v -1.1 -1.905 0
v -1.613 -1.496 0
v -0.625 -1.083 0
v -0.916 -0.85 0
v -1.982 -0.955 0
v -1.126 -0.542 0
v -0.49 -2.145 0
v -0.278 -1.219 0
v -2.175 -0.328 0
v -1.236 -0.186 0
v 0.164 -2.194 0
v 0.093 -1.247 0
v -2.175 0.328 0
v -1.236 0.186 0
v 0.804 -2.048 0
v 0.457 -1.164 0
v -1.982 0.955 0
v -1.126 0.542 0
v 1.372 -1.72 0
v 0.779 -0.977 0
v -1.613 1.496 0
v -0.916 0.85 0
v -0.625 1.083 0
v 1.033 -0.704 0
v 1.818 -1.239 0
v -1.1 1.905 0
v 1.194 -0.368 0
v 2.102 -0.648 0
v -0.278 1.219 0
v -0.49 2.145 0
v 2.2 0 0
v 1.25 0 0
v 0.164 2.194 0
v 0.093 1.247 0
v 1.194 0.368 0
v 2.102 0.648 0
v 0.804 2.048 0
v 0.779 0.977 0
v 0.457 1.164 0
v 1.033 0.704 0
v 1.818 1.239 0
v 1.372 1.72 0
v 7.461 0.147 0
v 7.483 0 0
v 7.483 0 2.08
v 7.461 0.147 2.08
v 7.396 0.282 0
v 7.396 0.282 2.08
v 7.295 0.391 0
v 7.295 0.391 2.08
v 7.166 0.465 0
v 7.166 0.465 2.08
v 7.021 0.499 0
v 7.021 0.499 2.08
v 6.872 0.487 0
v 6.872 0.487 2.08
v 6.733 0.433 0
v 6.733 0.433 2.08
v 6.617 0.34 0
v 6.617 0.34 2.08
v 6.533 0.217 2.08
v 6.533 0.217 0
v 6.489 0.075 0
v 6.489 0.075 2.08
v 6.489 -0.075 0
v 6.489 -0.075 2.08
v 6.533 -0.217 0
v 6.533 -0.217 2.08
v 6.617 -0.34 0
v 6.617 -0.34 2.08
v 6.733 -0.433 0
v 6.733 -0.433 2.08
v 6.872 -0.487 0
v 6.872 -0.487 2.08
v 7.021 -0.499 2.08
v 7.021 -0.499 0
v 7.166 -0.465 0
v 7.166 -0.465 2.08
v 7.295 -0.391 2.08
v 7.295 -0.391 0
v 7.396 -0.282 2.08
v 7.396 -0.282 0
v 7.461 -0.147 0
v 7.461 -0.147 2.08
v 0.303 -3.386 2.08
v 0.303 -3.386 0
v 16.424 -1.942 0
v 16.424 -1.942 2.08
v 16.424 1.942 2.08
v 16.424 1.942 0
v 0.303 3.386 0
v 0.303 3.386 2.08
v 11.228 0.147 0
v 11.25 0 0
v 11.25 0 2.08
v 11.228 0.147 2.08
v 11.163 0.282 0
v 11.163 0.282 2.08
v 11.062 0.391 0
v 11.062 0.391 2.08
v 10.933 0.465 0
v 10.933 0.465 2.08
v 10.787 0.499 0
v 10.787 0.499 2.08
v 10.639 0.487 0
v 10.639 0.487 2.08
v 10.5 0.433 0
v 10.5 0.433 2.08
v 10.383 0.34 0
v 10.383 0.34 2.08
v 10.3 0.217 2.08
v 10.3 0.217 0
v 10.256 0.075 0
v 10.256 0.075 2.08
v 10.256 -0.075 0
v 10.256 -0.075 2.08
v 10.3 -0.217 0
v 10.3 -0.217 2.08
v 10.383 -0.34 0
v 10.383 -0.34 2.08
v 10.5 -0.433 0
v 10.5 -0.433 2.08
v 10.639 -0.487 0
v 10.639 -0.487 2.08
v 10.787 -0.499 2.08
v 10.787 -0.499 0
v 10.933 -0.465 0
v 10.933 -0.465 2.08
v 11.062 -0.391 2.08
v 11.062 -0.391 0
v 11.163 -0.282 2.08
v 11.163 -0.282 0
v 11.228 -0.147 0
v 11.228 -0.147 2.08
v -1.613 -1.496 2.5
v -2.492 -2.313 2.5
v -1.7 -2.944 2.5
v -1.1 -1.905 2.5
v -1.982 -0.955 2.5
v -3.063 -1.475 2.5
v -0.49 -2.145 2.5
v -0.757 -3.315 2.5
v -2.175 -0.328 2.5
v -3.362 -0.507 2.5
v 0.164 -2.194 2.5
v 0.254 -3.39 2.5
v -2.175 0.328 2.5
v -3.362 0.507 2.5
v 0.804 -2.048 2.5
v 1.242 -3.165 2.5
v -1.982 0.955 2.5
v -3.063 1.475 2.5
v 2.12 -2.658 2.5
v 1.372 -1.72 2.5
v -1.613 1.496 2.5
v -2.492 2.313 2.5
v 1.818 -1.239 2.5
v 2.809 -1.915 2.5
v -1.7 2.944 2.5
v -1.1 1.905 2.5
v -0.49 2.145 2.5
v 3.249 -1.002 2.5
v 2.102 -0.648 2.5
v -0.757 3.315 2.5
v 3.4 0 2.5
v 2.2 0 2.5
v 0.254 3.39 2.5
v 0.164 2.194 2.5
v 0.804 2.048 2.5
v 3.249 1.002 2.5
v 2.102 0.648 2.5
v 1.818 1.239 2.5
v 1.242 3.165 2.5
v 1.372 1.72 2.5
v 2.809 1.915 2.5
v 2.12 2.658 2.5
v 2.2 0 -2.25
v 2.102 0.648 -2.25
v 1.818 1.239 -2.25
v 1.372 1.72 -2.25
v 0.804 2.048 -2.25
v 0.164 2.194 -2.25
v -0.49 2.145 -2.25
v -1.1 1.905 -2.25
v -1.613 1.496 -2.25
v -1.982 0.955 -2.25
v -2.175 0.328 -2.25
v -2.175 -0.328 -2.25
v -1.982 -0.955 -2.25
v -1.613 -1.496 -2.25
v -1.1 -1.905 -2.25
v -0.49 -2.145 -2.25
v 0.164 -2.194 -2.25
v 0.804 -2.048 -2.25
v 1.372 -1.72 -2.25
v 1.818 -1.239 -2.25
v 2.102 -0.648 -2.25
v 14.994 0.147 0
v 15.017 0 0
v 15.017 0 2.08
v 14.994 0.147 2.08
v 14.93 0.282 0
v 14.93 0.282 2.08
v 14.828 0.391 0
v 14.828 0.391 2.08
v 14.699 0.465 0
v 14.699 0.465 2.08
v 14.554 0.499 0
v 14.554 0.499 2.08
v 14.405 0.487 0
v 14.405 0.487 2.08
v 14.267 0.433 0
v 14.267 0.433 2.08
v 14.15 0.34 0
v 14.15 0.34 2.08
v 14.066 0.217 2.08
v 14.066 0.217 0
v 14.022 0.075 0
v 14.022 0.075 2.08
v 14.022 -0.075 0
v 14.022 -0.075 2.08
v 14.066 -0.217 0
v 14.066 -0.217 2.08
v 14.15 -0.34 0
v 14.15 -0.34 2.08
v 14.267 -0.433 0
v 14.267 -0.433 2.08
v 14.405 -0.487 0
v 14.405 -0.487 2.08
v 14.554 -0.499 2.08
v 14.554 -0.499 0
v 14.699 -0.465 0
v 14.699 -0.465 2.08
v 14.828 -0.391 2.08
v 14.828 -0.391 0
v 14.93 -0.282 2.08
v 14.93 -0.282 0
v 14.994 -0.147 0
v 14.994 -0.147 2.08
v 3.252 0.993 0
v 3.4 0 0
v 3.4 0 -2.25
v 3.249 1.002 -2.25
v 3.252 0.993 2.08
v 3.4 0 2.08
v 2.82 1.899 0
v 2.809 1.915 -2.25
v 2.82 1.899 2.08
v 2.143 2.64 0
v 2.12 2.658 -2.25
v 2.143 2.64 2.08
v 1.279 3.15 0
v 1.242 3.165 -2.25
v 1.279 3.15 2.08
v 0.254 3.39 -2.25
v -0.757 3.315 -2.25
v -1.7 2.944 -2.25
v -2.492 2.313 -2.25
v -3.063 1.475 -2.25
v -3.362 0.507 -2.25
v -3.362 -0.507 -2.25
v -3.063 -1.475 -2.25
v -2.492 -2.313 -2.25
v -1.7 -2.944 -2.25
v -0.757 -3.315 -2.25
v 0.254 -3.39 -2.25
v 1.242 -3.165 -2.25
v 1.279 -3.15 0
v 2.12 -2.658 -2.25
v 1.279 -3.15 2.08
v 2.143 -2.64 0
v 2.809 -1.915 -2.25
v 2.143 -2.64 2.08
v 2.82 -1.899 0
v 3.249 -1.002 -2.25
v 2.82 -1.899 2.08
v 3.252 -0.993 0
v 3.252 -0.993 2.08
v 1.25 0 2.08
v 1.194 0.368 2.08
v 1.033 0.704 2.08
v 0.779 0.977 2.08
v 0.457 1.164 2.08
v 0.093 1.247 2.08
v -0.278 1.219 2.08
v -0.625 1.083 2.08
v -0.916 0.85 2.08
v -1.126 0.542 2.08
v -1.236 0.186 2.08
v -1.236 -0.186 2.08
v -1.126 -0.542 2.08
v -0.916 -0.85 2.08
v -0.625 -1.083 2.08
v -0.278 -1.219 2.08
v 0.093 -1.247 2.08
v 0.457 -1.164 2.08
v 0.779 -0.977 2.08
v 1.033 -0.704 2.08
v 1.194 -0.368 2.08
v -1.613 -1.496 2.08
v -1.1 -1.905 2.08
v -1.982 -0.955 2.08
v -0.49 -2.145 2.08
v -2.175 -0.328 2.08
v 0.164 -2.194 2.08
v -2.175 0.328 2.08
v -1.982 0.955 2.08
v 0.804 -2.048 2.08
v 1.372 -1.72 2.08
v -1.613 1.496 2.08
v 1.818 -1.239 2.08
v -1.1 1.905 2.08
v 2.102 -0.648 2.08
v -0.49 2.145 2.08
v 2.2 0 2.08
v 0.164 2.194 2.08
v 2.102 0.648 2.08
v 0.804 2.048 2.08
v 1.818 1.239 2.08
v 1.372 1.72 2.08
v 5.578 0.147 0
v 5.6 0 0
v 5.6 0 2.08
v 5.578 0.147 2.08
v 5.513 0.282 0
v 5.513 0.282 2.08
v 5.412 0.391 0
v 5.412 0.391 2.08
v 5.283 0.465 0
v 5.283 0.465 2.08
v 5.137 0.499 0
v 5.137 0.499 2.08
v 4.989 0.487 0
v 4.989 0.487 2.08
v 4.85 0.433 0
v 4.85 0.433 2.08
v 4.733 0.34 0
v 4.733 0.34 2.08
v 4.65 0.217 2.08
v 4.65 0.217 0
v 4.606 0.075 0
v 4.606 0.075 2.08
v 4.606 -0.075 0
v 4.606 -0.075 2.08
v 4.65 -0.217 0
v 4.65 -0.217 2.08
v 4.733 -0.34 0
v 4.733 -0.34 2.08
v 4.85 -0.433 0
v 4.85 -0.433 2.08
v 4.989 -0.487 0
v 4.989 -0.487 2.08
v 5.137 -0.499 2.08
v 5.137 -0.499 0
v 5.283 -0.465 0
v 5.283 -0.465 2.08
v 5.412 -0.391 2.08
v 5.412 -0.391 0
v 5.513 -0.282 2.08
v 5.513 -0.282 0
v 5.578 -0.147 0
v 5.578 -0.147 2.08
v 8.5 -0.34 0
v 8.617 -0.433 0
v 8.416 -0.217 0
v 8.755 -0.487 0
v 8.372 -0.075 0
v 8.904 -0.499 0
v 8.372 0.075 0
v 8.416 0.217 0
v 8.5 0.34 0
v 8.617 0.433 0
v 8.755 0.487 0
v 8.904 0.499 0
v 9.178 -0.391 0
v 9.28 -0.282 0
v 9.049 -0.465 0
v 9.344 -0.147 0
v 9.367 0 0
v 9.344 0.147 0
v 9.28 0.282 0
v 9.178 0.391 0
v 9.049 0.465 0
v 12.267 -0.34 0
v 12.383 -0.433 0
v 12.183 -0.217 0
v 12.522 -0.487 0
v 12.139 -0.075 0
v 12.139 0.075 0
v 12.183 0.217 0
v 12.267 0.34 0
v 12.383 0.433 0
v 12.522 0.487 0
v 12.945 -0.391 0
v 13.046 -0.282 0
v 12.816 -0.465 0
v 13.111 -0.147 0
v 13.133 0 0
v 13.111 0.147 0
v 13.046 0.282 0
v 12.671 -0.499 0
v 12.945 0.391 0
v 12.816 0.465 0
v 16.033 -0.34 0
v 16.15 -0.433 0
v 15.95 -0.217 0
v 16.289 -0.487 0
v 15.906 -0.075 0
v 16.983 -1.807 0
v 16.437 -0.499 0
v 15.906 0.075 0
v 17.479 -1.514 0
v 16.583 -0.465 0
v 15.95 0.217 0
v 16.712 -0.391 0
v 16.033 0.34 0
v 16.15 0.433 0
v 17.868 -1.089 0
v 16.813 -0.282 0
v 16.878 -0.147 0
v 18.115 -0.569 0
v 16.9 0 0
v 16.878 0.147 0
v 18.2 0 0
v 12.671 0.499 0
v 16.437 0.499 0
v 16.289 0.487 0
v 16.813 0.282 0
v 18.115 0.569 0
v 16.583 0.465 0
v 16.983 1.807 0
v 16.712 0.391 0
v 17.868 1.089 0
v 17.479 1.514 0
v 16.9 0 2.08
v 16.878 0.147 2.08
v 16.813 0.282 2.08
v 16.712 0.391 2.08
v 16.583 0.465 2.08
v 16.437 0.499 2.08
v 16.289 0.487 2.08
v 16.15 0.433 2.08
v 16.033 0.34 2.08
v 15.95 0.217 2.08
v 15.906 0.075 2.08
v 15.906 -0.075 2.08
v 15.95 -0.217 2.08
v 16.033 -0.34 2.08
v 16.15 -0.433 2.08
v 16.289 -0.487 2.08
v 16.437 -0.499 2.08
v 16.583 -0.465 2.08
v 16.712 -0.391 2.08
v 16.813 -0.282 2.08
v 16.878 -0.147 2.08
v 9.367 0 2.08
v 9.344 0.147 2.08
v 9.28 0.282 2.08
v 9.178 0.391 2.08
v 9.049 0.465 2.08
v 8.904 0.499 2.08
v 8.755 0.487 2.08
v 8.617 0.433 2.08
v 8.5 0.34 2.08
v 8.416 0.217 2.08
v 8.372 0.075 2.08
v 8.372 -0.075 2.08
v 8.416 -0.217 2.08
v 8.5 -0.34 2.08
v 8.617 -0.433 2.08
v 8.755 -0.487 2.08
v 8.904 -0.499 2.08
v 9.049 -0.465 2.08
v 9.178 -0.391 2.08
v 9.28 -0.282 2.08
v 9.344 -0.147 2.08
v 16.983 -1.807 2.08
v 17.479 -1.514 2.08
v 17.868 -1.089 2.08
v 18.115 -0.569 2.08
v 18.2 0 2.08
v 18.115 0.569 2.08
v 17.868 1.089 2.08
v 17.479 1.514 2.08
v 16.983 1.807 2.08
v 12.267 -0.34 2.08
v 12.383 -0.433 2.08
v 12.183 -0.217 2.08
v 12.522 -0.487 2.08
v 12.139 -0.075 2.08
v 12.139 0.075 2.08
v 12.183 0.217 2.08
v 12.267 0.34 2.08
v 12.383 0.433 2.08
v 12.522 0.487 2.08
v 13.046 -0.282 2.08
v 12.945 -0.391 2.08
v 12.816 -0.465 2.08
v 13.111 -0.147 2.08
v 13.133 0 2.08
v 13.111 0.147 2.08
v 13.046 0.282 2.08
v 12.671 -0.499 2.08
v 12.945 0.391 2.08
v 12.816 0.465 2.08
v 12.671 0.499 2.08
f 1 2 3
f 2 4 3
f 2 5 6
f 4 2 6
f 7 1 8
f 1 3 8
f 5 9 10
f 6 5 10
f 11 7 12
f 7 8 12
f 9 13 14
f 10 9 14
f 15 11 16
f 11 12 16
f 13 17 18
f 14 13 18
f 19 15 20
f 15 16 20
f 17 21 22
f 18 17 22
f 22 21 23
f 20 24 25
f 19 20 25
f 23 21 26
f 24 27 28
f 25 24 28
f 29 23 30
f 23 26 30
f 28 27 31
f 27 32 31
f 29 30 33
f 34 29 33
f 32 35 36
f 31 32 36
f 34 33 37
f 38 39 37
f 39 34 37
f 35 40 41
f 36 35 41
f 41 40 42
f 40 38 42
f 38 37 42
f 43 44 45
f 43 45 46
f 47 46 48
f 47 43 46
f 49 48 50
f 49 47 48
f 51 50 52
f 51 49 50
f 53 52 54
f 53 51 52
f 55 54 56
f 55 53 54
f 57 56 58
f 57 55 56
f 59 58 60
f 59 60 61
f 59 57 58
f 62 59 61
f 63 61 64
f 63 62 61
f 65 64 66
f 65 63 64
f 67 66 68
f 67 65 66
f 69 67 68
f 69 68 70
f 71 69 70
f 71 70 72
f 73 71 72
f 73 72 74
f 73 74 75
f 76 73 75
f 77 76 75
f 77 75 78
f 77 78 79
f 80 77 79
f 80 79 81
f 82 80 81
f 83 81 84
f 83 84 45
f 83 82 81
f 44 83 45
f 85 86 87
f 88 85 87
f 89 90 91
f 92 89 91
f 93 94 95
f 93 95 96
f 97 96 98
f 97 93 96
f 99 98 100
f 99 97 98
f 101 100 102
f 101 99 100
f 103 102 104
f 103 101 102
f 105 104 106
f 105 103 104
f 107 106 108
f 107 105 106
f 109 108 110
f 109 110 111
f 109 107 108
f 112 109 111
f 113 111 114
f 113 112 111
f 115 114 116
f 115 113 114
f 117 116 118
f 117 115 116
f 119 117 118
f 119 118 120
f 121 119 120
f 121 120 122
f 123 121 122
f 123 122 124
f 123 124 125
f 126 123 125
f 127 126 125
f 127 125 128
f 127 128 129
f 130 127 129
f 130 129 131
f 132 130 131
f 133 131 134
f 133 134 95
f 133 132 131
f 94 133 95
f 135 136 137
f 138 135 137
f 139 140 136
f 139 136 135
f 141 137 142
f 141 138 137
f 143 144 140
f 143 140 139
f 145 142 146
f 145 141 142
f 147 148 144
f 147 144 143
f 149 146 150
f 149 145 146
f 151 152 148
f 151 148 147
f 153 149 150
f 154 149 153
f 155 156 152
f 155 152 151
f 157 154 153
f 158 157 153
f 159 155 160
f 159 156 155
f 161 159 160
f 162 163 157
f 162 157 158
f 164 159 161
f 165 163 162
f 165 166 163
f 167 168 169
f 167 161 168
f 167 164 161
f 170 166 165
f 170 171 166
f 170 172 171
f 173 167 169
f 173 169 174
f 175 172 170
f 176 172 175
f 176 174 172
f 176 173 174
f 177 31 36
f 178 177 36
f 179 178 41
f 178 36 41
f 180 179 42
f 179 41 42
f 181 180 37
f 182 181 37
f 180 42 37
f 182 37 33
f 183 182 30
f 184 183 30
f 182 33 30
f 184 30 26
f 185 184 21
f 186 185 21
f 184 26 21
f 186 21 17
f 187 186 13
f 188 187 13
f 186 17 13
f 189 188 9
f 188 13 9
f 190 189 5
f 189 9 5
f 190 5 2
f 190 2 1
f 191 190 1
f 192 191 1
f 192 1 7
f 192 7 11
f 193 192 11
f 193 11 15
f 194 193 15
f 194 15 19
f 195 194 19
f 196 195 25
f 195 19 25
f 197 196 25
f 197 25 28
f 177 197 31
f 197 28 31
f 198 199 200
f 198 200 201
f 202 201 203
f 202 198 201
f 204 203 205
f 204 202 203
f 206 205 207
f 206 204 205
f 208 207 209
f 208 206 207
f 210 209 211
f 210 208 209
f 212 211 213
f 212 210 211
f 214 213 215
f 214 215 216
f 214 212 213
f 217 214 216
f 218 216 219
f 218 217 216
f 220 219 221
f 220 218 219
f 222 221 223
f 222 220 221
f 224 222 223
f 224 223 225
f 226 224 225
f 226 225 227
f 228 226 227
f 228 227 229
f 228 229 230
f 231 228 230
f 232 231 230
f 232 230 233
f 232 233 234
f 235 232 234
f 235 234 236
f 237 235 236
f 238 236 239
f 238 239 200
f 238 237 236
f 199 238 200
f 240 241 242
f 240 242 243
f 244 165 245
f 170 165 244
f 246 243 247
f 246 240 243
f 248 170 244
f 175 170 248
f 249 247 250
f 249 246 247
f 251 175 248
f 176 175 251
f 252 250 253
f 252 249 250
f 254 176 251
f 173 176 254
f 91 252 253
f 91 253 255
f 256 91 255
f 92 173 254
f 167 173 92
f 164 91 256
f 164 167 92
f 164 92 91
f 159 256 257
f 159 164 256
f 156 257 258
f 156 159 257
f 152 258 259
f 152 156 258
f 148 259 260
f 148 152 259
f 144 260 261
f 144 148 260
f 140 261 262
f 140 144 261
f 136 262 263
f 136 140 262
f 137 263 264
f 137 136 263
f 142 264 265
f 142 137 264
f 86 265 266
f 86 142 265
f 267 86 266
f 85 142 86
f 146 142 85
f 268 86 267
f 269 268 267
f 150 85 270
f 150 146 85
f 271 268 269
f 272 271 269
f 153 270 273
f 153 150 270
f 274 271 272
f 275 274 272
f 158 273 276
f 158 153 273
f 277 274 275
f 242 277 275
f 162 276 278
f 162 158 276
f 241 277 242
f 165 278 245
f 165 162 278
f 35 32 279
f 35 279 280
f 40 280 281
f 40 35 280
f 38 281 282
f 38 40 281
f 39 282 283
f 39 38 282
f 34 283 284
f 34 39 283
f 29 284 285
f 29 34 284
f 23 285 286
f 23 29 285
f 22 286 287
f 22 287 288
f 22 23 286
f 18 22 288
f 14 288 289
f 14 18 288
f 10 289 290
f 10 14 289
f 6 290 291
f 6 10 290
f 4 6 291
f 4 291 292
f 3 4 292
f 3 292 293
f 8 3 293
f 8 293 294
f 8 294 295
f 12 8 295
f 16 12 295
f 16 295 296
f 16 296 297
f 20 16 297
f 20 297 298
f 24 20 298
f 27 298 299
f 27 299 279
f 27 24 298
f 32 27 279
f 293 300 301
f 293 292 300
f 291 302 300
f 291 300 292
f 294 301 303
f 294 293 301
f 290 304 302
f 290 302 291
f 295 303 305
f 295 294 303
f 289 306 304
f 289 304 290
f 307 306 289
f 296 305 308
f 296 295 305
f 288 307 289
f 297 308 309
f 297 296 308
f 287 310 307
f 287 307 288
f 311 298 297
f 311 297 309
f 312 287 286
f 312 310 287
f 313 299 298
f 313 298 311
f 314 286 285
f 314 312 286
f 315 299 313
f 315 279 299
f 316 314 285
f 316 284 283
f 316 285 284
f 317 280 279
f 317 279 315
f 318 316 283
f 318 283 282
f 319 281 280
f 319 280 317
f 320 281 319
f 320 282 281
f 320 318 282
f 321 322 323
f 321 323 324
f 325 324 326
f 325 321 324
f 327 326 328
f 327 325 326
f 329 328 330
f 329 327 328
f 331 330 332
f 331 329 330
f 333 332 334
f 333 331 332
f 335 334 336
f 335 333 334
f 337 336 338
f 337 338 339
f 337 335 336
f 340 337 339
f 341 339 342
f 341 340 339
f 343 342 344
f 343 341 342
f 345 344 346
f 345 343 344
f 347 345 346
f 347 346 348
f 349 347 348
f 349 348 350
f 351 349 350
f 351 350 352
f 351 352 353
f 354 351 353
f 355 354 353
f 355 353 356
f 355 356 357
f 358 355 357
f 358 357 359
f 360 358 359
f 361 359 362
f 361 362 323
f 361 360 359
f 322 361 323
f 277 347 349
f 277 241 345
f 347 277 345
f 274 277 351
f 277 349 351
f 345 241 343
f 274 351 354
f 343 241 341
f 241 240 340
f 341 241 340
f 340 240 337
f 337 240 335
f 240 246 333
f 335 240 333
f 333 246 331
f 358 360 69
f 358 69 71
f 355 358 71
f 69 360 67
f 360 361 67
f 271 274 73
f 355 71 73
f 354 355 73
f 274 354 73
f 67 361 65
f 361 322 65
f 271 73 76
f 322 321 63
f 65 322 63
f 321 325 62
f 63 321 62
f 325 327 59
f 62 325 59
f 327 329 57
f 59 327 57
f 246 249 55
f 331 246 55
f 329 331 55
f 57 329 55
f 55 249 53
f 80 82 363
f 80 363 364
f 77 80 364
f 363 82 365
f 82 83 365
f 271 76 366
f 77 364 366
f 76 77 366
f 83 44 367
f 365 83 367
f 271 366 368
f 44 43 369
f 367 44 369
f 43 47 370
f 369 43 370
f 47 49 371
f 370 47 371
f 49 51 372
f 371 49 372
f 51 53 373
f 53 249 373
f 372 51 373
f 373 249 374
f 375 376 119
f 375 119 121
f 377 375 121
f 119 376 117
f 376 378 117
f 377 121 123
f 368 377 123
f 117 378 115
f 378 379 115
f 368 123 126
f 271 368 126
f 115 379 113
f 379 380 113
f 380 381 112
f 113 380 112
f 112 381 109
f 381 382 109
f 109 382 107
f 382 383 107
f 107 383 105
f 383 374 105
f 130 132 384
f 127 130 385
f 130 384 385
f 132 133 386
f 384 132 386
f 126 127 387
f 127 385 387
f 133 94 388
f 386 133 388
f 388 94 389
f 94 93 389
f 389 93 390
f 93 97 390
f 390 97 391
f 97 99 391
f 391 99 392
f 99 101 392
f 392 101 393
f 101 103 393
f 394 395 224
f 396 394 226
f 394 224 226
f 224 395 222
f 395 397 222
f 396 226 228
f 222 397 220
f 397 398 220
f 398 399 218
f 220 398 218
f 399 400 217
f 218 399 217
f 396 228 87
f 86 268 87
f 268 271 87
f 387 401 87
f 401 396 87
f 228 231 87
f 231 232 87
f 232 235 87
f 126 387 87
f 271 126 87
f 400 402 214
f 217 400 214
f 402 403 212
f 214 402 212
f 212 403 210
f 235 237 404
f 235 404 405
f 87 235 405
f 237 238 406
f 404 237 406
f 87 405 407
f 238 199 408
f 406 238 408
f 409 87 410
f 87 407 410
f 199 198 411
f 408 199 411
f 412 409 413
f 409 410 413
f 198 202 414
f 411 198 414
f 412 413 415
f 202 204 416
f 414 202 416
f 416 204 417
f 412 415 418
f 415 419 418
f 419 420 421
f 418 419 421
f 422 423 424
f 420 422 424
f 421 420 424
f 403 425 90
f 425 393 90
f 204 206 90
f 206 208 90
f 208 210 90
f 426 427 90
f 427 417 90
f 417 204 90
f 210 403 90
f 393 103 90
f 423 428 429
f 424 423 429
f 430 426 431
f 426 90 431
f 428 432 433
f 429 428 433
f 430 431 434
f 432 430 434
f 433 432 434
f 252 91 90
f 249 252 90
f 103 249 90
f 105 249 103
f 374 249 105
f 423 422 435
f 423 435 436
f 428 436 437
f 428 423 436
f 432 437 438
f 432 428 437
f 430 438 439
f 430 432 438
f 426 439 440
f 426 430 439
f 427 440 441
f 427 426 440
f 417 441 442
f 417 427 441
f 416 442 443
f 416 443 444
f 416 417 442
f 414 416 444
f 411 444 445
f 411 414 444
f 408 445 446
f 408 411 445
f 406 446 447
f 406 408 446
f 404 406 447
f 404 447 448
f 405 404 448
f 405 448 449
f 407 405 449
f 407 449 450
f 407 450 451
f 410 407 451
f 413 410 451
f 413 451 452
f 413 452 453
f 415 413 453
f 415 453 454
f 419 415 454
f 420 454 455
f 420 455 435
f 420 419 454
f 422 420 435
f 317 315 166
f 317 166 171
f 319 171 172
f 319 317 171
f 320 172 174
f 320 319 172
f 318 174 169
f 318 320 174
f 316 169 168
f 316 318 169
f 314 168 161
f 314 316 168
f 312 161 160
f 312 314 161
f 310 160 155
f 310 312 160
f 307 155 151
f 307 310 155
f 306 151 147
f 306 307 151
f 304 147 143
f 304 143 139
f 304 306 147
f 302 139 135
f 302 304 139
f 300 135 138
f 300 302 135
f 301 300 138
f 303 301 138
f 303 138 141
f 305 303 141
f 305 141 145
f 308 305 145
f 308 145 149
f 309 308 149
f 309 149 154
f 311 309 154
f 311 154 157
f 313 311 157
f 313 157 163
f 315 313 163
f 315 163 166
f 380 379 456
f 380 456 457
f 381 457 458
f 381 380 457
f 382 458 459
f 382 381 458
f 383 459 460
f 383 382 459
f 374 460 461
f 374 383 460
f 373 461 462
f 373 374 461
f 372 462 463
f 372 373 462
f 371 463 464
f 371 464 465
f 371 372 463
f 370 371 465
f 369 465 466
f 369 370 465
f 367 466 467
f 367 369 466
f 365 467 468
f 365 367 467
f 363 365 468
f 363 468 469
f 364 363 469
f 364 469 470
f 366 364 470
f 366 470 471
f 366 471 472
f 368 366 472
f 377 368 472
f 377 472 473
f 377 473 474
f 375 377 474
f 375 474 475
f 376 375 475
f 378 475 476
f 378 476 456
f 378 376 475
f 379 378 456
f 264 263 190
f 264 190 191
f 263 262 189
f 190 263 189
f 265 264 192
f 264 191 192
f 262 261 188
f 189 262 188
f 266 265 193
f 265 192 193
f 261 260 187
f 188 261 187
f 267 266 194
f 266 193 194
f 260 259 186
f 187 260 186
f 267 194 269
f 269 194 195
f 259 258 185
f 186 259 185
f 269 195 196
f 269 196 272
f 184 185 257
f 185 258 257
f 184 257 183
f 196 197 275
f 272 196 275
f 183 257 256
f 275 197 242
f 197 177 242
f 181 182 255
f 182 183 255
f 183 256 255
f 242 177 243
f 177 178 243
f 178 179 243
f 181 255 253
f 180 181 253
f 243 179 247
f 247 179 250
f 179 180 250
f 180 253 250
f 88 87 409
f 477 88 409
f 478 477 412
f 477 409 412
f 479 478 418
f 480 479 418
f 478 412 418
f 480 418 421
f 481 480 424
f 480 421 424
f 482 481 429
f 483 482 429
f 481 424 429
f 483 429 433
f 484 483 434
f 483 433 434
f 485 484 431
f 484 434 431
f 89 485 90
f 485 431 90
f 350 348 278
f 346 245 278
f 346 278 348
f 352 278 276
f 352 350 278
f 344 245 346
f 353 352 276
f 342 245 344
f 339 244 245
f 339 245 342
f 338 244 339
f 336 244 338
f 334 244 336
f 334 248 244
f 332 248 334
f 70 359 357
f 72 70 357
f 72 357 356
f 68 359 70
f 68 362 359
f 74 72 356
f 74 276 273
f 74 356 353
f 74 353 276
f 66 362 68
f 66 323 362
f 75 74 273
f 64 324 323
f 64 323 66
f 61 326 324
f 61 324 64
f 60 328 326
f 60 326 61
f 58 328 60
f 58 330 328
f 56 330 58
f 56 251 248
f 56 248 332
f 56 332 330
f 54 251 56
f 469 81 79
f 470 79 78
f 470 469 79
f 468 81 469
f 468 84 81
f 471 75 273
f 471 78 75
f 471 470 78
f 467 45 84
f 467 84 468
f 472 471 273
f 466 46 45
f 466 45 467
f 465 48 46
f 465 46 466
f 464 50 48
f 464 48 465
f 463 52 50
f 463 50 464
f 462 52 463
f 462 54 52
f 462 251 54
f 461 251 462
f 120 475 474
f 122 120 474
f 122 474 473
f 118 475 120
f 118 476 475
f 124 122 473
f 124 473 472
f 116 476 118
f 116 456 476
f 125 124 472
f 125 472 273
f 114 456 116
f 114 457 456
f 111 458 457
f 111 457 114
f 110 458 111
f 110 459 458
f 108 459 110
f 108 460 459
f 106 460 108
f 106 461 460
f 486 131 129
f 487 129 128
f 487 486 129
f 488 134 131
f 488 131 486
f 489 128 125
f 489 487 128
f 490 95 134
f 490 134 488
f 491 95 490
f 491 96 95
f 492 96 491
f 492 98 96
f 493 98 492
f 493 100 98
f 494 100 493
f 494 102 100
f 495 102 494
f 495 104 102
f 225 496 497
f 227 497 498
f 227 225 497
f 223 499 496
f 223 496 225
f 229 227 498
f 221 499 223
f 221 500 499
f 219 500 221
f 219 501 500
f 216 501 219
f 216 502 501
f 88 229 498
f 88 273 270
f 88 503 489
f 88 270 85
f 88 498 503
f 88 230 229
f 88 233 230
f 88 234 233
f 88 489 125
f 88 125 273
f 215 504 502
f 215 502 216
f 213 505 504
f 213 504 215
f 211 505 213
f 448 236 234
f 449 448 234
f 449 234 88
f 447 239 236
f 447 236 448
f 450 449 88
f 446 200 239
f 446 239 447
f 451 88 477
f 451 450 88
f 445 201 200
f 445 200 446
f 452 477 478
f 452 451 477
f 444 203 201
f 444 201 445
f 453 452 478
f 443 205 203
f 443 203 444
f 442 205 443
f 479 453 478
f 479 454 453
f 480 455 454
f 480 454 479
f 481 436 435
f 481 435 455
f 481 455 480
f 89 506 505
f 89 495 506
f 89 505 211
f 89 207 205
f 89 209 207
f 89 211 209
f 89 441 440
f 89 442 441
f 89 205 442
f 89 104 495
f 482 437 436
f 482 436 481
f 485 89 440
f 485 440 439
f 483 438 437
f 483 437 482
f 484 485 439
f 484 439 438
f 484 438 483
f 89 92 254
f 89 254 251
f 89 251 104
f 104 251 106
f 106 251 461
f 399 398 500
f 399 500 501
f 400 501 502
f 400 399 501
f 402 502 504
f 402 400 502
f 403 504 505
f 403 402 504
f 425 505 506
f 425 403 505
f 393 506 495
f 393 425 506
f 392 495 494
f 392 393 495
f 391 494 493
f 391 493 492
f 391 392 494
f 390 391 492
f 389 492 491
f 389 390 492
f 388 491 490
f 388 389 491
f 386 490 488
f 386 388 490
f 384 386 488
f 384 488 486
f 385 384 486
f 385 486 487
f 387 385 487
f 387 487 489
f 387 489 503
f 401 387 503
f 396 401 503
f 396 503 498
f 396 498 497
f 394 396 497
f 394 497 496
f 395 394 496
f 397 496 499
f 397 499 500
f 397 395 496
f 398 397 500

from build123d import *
from build123d.topology import SkipClean

# Parameters (mm, degrees)
SKETCH1_R             = 0.5
SKETCH1_R_2           = 1.25
BASE_DEPTH            = 2.08
CONNECTION_DEPTH      = 2.5
CONNECTION_DEPTH_BACK = 2.25
SKETCH1_3_R           = 2.2


with BuildPart() as part:
    # Sketch1 → Base (new body)
    with BuildSketch(Plane.XY):
        with BuildLine():
            ThreePointArc((16.424, -1.942221409), (18.2, 0), (16.424, 1.942221409))
            Line((16.424, 1.942221409), (0.303384615, 3.386437328))
            ThreePointArc((0.303384615, 3.386437328), (-3.4, 0), (0.303384615, -3.386437328))
            Line((0.303384615, -3.386437328), (16.424, -1.942221409))
        make_face()
        with Locations((5.1, 0)):
            Circle(SKETCH1_R, mode=Mode.SUBTRACT)
        with Locations((6.983333333, 0)):
            Circle(SKETCH1_R, mode=Mode.SUBTRACT)
        with Locations((8.866666667, 0)):
            Circle(SKETCH1_R, mode=Mode.SUBTRACT)
        with Locations((10.75, 0)):
            Circle(SKETCH1_R, mode=Mode.SUBTRACT)
        with Locations((12.633333333, 0)):
            Circle(SKETCH1_R, mode=Mode.SUBTRACT)
        with Locations((14.516666667, 0)):
            Circle(SKETCH1_R, mode=Mode.SUBTRACT)
        with Locations((16.4, 0)):
            Circle(SKETCH1_R, mode=Mode.SUBTRACT)
        Circle(SKETCH1_R_2, mode=Mode.SUBTRACT)
    extrude(amount=BASE_DEPTH)

    # Sketch1<3> → Connection (add, two sides: drawn at the far end of the back side and taken through both)
    with SkipClean():  # the faces are left unmerged after this step: merging them gives an invalid solid
        with BuildSketch(Plane.XY.offset(-CONNECTION_DEPTH_BACK)):
            with BuildLine():
                ThreePointArc((3.4, 0), (2.509134083, 2.294394507), (0.303384615, 3.386437328))
                ThreePointArc((0.303384615, 3.386437328), (-3.4, 0), (0.303384615, -3.386437328))
                ThreePointArc((0.303384615, -3.386437328), (2.509134083, -2.294394507), (3.4, 0))
            make_face()
            Circle(SKETCH1_3_R, mode=Mode.SUBTRACT)
        extrude(amount=CONNECTION_DEPTH + CONNECTION_DEPTH_BACK)


solid = part.part
